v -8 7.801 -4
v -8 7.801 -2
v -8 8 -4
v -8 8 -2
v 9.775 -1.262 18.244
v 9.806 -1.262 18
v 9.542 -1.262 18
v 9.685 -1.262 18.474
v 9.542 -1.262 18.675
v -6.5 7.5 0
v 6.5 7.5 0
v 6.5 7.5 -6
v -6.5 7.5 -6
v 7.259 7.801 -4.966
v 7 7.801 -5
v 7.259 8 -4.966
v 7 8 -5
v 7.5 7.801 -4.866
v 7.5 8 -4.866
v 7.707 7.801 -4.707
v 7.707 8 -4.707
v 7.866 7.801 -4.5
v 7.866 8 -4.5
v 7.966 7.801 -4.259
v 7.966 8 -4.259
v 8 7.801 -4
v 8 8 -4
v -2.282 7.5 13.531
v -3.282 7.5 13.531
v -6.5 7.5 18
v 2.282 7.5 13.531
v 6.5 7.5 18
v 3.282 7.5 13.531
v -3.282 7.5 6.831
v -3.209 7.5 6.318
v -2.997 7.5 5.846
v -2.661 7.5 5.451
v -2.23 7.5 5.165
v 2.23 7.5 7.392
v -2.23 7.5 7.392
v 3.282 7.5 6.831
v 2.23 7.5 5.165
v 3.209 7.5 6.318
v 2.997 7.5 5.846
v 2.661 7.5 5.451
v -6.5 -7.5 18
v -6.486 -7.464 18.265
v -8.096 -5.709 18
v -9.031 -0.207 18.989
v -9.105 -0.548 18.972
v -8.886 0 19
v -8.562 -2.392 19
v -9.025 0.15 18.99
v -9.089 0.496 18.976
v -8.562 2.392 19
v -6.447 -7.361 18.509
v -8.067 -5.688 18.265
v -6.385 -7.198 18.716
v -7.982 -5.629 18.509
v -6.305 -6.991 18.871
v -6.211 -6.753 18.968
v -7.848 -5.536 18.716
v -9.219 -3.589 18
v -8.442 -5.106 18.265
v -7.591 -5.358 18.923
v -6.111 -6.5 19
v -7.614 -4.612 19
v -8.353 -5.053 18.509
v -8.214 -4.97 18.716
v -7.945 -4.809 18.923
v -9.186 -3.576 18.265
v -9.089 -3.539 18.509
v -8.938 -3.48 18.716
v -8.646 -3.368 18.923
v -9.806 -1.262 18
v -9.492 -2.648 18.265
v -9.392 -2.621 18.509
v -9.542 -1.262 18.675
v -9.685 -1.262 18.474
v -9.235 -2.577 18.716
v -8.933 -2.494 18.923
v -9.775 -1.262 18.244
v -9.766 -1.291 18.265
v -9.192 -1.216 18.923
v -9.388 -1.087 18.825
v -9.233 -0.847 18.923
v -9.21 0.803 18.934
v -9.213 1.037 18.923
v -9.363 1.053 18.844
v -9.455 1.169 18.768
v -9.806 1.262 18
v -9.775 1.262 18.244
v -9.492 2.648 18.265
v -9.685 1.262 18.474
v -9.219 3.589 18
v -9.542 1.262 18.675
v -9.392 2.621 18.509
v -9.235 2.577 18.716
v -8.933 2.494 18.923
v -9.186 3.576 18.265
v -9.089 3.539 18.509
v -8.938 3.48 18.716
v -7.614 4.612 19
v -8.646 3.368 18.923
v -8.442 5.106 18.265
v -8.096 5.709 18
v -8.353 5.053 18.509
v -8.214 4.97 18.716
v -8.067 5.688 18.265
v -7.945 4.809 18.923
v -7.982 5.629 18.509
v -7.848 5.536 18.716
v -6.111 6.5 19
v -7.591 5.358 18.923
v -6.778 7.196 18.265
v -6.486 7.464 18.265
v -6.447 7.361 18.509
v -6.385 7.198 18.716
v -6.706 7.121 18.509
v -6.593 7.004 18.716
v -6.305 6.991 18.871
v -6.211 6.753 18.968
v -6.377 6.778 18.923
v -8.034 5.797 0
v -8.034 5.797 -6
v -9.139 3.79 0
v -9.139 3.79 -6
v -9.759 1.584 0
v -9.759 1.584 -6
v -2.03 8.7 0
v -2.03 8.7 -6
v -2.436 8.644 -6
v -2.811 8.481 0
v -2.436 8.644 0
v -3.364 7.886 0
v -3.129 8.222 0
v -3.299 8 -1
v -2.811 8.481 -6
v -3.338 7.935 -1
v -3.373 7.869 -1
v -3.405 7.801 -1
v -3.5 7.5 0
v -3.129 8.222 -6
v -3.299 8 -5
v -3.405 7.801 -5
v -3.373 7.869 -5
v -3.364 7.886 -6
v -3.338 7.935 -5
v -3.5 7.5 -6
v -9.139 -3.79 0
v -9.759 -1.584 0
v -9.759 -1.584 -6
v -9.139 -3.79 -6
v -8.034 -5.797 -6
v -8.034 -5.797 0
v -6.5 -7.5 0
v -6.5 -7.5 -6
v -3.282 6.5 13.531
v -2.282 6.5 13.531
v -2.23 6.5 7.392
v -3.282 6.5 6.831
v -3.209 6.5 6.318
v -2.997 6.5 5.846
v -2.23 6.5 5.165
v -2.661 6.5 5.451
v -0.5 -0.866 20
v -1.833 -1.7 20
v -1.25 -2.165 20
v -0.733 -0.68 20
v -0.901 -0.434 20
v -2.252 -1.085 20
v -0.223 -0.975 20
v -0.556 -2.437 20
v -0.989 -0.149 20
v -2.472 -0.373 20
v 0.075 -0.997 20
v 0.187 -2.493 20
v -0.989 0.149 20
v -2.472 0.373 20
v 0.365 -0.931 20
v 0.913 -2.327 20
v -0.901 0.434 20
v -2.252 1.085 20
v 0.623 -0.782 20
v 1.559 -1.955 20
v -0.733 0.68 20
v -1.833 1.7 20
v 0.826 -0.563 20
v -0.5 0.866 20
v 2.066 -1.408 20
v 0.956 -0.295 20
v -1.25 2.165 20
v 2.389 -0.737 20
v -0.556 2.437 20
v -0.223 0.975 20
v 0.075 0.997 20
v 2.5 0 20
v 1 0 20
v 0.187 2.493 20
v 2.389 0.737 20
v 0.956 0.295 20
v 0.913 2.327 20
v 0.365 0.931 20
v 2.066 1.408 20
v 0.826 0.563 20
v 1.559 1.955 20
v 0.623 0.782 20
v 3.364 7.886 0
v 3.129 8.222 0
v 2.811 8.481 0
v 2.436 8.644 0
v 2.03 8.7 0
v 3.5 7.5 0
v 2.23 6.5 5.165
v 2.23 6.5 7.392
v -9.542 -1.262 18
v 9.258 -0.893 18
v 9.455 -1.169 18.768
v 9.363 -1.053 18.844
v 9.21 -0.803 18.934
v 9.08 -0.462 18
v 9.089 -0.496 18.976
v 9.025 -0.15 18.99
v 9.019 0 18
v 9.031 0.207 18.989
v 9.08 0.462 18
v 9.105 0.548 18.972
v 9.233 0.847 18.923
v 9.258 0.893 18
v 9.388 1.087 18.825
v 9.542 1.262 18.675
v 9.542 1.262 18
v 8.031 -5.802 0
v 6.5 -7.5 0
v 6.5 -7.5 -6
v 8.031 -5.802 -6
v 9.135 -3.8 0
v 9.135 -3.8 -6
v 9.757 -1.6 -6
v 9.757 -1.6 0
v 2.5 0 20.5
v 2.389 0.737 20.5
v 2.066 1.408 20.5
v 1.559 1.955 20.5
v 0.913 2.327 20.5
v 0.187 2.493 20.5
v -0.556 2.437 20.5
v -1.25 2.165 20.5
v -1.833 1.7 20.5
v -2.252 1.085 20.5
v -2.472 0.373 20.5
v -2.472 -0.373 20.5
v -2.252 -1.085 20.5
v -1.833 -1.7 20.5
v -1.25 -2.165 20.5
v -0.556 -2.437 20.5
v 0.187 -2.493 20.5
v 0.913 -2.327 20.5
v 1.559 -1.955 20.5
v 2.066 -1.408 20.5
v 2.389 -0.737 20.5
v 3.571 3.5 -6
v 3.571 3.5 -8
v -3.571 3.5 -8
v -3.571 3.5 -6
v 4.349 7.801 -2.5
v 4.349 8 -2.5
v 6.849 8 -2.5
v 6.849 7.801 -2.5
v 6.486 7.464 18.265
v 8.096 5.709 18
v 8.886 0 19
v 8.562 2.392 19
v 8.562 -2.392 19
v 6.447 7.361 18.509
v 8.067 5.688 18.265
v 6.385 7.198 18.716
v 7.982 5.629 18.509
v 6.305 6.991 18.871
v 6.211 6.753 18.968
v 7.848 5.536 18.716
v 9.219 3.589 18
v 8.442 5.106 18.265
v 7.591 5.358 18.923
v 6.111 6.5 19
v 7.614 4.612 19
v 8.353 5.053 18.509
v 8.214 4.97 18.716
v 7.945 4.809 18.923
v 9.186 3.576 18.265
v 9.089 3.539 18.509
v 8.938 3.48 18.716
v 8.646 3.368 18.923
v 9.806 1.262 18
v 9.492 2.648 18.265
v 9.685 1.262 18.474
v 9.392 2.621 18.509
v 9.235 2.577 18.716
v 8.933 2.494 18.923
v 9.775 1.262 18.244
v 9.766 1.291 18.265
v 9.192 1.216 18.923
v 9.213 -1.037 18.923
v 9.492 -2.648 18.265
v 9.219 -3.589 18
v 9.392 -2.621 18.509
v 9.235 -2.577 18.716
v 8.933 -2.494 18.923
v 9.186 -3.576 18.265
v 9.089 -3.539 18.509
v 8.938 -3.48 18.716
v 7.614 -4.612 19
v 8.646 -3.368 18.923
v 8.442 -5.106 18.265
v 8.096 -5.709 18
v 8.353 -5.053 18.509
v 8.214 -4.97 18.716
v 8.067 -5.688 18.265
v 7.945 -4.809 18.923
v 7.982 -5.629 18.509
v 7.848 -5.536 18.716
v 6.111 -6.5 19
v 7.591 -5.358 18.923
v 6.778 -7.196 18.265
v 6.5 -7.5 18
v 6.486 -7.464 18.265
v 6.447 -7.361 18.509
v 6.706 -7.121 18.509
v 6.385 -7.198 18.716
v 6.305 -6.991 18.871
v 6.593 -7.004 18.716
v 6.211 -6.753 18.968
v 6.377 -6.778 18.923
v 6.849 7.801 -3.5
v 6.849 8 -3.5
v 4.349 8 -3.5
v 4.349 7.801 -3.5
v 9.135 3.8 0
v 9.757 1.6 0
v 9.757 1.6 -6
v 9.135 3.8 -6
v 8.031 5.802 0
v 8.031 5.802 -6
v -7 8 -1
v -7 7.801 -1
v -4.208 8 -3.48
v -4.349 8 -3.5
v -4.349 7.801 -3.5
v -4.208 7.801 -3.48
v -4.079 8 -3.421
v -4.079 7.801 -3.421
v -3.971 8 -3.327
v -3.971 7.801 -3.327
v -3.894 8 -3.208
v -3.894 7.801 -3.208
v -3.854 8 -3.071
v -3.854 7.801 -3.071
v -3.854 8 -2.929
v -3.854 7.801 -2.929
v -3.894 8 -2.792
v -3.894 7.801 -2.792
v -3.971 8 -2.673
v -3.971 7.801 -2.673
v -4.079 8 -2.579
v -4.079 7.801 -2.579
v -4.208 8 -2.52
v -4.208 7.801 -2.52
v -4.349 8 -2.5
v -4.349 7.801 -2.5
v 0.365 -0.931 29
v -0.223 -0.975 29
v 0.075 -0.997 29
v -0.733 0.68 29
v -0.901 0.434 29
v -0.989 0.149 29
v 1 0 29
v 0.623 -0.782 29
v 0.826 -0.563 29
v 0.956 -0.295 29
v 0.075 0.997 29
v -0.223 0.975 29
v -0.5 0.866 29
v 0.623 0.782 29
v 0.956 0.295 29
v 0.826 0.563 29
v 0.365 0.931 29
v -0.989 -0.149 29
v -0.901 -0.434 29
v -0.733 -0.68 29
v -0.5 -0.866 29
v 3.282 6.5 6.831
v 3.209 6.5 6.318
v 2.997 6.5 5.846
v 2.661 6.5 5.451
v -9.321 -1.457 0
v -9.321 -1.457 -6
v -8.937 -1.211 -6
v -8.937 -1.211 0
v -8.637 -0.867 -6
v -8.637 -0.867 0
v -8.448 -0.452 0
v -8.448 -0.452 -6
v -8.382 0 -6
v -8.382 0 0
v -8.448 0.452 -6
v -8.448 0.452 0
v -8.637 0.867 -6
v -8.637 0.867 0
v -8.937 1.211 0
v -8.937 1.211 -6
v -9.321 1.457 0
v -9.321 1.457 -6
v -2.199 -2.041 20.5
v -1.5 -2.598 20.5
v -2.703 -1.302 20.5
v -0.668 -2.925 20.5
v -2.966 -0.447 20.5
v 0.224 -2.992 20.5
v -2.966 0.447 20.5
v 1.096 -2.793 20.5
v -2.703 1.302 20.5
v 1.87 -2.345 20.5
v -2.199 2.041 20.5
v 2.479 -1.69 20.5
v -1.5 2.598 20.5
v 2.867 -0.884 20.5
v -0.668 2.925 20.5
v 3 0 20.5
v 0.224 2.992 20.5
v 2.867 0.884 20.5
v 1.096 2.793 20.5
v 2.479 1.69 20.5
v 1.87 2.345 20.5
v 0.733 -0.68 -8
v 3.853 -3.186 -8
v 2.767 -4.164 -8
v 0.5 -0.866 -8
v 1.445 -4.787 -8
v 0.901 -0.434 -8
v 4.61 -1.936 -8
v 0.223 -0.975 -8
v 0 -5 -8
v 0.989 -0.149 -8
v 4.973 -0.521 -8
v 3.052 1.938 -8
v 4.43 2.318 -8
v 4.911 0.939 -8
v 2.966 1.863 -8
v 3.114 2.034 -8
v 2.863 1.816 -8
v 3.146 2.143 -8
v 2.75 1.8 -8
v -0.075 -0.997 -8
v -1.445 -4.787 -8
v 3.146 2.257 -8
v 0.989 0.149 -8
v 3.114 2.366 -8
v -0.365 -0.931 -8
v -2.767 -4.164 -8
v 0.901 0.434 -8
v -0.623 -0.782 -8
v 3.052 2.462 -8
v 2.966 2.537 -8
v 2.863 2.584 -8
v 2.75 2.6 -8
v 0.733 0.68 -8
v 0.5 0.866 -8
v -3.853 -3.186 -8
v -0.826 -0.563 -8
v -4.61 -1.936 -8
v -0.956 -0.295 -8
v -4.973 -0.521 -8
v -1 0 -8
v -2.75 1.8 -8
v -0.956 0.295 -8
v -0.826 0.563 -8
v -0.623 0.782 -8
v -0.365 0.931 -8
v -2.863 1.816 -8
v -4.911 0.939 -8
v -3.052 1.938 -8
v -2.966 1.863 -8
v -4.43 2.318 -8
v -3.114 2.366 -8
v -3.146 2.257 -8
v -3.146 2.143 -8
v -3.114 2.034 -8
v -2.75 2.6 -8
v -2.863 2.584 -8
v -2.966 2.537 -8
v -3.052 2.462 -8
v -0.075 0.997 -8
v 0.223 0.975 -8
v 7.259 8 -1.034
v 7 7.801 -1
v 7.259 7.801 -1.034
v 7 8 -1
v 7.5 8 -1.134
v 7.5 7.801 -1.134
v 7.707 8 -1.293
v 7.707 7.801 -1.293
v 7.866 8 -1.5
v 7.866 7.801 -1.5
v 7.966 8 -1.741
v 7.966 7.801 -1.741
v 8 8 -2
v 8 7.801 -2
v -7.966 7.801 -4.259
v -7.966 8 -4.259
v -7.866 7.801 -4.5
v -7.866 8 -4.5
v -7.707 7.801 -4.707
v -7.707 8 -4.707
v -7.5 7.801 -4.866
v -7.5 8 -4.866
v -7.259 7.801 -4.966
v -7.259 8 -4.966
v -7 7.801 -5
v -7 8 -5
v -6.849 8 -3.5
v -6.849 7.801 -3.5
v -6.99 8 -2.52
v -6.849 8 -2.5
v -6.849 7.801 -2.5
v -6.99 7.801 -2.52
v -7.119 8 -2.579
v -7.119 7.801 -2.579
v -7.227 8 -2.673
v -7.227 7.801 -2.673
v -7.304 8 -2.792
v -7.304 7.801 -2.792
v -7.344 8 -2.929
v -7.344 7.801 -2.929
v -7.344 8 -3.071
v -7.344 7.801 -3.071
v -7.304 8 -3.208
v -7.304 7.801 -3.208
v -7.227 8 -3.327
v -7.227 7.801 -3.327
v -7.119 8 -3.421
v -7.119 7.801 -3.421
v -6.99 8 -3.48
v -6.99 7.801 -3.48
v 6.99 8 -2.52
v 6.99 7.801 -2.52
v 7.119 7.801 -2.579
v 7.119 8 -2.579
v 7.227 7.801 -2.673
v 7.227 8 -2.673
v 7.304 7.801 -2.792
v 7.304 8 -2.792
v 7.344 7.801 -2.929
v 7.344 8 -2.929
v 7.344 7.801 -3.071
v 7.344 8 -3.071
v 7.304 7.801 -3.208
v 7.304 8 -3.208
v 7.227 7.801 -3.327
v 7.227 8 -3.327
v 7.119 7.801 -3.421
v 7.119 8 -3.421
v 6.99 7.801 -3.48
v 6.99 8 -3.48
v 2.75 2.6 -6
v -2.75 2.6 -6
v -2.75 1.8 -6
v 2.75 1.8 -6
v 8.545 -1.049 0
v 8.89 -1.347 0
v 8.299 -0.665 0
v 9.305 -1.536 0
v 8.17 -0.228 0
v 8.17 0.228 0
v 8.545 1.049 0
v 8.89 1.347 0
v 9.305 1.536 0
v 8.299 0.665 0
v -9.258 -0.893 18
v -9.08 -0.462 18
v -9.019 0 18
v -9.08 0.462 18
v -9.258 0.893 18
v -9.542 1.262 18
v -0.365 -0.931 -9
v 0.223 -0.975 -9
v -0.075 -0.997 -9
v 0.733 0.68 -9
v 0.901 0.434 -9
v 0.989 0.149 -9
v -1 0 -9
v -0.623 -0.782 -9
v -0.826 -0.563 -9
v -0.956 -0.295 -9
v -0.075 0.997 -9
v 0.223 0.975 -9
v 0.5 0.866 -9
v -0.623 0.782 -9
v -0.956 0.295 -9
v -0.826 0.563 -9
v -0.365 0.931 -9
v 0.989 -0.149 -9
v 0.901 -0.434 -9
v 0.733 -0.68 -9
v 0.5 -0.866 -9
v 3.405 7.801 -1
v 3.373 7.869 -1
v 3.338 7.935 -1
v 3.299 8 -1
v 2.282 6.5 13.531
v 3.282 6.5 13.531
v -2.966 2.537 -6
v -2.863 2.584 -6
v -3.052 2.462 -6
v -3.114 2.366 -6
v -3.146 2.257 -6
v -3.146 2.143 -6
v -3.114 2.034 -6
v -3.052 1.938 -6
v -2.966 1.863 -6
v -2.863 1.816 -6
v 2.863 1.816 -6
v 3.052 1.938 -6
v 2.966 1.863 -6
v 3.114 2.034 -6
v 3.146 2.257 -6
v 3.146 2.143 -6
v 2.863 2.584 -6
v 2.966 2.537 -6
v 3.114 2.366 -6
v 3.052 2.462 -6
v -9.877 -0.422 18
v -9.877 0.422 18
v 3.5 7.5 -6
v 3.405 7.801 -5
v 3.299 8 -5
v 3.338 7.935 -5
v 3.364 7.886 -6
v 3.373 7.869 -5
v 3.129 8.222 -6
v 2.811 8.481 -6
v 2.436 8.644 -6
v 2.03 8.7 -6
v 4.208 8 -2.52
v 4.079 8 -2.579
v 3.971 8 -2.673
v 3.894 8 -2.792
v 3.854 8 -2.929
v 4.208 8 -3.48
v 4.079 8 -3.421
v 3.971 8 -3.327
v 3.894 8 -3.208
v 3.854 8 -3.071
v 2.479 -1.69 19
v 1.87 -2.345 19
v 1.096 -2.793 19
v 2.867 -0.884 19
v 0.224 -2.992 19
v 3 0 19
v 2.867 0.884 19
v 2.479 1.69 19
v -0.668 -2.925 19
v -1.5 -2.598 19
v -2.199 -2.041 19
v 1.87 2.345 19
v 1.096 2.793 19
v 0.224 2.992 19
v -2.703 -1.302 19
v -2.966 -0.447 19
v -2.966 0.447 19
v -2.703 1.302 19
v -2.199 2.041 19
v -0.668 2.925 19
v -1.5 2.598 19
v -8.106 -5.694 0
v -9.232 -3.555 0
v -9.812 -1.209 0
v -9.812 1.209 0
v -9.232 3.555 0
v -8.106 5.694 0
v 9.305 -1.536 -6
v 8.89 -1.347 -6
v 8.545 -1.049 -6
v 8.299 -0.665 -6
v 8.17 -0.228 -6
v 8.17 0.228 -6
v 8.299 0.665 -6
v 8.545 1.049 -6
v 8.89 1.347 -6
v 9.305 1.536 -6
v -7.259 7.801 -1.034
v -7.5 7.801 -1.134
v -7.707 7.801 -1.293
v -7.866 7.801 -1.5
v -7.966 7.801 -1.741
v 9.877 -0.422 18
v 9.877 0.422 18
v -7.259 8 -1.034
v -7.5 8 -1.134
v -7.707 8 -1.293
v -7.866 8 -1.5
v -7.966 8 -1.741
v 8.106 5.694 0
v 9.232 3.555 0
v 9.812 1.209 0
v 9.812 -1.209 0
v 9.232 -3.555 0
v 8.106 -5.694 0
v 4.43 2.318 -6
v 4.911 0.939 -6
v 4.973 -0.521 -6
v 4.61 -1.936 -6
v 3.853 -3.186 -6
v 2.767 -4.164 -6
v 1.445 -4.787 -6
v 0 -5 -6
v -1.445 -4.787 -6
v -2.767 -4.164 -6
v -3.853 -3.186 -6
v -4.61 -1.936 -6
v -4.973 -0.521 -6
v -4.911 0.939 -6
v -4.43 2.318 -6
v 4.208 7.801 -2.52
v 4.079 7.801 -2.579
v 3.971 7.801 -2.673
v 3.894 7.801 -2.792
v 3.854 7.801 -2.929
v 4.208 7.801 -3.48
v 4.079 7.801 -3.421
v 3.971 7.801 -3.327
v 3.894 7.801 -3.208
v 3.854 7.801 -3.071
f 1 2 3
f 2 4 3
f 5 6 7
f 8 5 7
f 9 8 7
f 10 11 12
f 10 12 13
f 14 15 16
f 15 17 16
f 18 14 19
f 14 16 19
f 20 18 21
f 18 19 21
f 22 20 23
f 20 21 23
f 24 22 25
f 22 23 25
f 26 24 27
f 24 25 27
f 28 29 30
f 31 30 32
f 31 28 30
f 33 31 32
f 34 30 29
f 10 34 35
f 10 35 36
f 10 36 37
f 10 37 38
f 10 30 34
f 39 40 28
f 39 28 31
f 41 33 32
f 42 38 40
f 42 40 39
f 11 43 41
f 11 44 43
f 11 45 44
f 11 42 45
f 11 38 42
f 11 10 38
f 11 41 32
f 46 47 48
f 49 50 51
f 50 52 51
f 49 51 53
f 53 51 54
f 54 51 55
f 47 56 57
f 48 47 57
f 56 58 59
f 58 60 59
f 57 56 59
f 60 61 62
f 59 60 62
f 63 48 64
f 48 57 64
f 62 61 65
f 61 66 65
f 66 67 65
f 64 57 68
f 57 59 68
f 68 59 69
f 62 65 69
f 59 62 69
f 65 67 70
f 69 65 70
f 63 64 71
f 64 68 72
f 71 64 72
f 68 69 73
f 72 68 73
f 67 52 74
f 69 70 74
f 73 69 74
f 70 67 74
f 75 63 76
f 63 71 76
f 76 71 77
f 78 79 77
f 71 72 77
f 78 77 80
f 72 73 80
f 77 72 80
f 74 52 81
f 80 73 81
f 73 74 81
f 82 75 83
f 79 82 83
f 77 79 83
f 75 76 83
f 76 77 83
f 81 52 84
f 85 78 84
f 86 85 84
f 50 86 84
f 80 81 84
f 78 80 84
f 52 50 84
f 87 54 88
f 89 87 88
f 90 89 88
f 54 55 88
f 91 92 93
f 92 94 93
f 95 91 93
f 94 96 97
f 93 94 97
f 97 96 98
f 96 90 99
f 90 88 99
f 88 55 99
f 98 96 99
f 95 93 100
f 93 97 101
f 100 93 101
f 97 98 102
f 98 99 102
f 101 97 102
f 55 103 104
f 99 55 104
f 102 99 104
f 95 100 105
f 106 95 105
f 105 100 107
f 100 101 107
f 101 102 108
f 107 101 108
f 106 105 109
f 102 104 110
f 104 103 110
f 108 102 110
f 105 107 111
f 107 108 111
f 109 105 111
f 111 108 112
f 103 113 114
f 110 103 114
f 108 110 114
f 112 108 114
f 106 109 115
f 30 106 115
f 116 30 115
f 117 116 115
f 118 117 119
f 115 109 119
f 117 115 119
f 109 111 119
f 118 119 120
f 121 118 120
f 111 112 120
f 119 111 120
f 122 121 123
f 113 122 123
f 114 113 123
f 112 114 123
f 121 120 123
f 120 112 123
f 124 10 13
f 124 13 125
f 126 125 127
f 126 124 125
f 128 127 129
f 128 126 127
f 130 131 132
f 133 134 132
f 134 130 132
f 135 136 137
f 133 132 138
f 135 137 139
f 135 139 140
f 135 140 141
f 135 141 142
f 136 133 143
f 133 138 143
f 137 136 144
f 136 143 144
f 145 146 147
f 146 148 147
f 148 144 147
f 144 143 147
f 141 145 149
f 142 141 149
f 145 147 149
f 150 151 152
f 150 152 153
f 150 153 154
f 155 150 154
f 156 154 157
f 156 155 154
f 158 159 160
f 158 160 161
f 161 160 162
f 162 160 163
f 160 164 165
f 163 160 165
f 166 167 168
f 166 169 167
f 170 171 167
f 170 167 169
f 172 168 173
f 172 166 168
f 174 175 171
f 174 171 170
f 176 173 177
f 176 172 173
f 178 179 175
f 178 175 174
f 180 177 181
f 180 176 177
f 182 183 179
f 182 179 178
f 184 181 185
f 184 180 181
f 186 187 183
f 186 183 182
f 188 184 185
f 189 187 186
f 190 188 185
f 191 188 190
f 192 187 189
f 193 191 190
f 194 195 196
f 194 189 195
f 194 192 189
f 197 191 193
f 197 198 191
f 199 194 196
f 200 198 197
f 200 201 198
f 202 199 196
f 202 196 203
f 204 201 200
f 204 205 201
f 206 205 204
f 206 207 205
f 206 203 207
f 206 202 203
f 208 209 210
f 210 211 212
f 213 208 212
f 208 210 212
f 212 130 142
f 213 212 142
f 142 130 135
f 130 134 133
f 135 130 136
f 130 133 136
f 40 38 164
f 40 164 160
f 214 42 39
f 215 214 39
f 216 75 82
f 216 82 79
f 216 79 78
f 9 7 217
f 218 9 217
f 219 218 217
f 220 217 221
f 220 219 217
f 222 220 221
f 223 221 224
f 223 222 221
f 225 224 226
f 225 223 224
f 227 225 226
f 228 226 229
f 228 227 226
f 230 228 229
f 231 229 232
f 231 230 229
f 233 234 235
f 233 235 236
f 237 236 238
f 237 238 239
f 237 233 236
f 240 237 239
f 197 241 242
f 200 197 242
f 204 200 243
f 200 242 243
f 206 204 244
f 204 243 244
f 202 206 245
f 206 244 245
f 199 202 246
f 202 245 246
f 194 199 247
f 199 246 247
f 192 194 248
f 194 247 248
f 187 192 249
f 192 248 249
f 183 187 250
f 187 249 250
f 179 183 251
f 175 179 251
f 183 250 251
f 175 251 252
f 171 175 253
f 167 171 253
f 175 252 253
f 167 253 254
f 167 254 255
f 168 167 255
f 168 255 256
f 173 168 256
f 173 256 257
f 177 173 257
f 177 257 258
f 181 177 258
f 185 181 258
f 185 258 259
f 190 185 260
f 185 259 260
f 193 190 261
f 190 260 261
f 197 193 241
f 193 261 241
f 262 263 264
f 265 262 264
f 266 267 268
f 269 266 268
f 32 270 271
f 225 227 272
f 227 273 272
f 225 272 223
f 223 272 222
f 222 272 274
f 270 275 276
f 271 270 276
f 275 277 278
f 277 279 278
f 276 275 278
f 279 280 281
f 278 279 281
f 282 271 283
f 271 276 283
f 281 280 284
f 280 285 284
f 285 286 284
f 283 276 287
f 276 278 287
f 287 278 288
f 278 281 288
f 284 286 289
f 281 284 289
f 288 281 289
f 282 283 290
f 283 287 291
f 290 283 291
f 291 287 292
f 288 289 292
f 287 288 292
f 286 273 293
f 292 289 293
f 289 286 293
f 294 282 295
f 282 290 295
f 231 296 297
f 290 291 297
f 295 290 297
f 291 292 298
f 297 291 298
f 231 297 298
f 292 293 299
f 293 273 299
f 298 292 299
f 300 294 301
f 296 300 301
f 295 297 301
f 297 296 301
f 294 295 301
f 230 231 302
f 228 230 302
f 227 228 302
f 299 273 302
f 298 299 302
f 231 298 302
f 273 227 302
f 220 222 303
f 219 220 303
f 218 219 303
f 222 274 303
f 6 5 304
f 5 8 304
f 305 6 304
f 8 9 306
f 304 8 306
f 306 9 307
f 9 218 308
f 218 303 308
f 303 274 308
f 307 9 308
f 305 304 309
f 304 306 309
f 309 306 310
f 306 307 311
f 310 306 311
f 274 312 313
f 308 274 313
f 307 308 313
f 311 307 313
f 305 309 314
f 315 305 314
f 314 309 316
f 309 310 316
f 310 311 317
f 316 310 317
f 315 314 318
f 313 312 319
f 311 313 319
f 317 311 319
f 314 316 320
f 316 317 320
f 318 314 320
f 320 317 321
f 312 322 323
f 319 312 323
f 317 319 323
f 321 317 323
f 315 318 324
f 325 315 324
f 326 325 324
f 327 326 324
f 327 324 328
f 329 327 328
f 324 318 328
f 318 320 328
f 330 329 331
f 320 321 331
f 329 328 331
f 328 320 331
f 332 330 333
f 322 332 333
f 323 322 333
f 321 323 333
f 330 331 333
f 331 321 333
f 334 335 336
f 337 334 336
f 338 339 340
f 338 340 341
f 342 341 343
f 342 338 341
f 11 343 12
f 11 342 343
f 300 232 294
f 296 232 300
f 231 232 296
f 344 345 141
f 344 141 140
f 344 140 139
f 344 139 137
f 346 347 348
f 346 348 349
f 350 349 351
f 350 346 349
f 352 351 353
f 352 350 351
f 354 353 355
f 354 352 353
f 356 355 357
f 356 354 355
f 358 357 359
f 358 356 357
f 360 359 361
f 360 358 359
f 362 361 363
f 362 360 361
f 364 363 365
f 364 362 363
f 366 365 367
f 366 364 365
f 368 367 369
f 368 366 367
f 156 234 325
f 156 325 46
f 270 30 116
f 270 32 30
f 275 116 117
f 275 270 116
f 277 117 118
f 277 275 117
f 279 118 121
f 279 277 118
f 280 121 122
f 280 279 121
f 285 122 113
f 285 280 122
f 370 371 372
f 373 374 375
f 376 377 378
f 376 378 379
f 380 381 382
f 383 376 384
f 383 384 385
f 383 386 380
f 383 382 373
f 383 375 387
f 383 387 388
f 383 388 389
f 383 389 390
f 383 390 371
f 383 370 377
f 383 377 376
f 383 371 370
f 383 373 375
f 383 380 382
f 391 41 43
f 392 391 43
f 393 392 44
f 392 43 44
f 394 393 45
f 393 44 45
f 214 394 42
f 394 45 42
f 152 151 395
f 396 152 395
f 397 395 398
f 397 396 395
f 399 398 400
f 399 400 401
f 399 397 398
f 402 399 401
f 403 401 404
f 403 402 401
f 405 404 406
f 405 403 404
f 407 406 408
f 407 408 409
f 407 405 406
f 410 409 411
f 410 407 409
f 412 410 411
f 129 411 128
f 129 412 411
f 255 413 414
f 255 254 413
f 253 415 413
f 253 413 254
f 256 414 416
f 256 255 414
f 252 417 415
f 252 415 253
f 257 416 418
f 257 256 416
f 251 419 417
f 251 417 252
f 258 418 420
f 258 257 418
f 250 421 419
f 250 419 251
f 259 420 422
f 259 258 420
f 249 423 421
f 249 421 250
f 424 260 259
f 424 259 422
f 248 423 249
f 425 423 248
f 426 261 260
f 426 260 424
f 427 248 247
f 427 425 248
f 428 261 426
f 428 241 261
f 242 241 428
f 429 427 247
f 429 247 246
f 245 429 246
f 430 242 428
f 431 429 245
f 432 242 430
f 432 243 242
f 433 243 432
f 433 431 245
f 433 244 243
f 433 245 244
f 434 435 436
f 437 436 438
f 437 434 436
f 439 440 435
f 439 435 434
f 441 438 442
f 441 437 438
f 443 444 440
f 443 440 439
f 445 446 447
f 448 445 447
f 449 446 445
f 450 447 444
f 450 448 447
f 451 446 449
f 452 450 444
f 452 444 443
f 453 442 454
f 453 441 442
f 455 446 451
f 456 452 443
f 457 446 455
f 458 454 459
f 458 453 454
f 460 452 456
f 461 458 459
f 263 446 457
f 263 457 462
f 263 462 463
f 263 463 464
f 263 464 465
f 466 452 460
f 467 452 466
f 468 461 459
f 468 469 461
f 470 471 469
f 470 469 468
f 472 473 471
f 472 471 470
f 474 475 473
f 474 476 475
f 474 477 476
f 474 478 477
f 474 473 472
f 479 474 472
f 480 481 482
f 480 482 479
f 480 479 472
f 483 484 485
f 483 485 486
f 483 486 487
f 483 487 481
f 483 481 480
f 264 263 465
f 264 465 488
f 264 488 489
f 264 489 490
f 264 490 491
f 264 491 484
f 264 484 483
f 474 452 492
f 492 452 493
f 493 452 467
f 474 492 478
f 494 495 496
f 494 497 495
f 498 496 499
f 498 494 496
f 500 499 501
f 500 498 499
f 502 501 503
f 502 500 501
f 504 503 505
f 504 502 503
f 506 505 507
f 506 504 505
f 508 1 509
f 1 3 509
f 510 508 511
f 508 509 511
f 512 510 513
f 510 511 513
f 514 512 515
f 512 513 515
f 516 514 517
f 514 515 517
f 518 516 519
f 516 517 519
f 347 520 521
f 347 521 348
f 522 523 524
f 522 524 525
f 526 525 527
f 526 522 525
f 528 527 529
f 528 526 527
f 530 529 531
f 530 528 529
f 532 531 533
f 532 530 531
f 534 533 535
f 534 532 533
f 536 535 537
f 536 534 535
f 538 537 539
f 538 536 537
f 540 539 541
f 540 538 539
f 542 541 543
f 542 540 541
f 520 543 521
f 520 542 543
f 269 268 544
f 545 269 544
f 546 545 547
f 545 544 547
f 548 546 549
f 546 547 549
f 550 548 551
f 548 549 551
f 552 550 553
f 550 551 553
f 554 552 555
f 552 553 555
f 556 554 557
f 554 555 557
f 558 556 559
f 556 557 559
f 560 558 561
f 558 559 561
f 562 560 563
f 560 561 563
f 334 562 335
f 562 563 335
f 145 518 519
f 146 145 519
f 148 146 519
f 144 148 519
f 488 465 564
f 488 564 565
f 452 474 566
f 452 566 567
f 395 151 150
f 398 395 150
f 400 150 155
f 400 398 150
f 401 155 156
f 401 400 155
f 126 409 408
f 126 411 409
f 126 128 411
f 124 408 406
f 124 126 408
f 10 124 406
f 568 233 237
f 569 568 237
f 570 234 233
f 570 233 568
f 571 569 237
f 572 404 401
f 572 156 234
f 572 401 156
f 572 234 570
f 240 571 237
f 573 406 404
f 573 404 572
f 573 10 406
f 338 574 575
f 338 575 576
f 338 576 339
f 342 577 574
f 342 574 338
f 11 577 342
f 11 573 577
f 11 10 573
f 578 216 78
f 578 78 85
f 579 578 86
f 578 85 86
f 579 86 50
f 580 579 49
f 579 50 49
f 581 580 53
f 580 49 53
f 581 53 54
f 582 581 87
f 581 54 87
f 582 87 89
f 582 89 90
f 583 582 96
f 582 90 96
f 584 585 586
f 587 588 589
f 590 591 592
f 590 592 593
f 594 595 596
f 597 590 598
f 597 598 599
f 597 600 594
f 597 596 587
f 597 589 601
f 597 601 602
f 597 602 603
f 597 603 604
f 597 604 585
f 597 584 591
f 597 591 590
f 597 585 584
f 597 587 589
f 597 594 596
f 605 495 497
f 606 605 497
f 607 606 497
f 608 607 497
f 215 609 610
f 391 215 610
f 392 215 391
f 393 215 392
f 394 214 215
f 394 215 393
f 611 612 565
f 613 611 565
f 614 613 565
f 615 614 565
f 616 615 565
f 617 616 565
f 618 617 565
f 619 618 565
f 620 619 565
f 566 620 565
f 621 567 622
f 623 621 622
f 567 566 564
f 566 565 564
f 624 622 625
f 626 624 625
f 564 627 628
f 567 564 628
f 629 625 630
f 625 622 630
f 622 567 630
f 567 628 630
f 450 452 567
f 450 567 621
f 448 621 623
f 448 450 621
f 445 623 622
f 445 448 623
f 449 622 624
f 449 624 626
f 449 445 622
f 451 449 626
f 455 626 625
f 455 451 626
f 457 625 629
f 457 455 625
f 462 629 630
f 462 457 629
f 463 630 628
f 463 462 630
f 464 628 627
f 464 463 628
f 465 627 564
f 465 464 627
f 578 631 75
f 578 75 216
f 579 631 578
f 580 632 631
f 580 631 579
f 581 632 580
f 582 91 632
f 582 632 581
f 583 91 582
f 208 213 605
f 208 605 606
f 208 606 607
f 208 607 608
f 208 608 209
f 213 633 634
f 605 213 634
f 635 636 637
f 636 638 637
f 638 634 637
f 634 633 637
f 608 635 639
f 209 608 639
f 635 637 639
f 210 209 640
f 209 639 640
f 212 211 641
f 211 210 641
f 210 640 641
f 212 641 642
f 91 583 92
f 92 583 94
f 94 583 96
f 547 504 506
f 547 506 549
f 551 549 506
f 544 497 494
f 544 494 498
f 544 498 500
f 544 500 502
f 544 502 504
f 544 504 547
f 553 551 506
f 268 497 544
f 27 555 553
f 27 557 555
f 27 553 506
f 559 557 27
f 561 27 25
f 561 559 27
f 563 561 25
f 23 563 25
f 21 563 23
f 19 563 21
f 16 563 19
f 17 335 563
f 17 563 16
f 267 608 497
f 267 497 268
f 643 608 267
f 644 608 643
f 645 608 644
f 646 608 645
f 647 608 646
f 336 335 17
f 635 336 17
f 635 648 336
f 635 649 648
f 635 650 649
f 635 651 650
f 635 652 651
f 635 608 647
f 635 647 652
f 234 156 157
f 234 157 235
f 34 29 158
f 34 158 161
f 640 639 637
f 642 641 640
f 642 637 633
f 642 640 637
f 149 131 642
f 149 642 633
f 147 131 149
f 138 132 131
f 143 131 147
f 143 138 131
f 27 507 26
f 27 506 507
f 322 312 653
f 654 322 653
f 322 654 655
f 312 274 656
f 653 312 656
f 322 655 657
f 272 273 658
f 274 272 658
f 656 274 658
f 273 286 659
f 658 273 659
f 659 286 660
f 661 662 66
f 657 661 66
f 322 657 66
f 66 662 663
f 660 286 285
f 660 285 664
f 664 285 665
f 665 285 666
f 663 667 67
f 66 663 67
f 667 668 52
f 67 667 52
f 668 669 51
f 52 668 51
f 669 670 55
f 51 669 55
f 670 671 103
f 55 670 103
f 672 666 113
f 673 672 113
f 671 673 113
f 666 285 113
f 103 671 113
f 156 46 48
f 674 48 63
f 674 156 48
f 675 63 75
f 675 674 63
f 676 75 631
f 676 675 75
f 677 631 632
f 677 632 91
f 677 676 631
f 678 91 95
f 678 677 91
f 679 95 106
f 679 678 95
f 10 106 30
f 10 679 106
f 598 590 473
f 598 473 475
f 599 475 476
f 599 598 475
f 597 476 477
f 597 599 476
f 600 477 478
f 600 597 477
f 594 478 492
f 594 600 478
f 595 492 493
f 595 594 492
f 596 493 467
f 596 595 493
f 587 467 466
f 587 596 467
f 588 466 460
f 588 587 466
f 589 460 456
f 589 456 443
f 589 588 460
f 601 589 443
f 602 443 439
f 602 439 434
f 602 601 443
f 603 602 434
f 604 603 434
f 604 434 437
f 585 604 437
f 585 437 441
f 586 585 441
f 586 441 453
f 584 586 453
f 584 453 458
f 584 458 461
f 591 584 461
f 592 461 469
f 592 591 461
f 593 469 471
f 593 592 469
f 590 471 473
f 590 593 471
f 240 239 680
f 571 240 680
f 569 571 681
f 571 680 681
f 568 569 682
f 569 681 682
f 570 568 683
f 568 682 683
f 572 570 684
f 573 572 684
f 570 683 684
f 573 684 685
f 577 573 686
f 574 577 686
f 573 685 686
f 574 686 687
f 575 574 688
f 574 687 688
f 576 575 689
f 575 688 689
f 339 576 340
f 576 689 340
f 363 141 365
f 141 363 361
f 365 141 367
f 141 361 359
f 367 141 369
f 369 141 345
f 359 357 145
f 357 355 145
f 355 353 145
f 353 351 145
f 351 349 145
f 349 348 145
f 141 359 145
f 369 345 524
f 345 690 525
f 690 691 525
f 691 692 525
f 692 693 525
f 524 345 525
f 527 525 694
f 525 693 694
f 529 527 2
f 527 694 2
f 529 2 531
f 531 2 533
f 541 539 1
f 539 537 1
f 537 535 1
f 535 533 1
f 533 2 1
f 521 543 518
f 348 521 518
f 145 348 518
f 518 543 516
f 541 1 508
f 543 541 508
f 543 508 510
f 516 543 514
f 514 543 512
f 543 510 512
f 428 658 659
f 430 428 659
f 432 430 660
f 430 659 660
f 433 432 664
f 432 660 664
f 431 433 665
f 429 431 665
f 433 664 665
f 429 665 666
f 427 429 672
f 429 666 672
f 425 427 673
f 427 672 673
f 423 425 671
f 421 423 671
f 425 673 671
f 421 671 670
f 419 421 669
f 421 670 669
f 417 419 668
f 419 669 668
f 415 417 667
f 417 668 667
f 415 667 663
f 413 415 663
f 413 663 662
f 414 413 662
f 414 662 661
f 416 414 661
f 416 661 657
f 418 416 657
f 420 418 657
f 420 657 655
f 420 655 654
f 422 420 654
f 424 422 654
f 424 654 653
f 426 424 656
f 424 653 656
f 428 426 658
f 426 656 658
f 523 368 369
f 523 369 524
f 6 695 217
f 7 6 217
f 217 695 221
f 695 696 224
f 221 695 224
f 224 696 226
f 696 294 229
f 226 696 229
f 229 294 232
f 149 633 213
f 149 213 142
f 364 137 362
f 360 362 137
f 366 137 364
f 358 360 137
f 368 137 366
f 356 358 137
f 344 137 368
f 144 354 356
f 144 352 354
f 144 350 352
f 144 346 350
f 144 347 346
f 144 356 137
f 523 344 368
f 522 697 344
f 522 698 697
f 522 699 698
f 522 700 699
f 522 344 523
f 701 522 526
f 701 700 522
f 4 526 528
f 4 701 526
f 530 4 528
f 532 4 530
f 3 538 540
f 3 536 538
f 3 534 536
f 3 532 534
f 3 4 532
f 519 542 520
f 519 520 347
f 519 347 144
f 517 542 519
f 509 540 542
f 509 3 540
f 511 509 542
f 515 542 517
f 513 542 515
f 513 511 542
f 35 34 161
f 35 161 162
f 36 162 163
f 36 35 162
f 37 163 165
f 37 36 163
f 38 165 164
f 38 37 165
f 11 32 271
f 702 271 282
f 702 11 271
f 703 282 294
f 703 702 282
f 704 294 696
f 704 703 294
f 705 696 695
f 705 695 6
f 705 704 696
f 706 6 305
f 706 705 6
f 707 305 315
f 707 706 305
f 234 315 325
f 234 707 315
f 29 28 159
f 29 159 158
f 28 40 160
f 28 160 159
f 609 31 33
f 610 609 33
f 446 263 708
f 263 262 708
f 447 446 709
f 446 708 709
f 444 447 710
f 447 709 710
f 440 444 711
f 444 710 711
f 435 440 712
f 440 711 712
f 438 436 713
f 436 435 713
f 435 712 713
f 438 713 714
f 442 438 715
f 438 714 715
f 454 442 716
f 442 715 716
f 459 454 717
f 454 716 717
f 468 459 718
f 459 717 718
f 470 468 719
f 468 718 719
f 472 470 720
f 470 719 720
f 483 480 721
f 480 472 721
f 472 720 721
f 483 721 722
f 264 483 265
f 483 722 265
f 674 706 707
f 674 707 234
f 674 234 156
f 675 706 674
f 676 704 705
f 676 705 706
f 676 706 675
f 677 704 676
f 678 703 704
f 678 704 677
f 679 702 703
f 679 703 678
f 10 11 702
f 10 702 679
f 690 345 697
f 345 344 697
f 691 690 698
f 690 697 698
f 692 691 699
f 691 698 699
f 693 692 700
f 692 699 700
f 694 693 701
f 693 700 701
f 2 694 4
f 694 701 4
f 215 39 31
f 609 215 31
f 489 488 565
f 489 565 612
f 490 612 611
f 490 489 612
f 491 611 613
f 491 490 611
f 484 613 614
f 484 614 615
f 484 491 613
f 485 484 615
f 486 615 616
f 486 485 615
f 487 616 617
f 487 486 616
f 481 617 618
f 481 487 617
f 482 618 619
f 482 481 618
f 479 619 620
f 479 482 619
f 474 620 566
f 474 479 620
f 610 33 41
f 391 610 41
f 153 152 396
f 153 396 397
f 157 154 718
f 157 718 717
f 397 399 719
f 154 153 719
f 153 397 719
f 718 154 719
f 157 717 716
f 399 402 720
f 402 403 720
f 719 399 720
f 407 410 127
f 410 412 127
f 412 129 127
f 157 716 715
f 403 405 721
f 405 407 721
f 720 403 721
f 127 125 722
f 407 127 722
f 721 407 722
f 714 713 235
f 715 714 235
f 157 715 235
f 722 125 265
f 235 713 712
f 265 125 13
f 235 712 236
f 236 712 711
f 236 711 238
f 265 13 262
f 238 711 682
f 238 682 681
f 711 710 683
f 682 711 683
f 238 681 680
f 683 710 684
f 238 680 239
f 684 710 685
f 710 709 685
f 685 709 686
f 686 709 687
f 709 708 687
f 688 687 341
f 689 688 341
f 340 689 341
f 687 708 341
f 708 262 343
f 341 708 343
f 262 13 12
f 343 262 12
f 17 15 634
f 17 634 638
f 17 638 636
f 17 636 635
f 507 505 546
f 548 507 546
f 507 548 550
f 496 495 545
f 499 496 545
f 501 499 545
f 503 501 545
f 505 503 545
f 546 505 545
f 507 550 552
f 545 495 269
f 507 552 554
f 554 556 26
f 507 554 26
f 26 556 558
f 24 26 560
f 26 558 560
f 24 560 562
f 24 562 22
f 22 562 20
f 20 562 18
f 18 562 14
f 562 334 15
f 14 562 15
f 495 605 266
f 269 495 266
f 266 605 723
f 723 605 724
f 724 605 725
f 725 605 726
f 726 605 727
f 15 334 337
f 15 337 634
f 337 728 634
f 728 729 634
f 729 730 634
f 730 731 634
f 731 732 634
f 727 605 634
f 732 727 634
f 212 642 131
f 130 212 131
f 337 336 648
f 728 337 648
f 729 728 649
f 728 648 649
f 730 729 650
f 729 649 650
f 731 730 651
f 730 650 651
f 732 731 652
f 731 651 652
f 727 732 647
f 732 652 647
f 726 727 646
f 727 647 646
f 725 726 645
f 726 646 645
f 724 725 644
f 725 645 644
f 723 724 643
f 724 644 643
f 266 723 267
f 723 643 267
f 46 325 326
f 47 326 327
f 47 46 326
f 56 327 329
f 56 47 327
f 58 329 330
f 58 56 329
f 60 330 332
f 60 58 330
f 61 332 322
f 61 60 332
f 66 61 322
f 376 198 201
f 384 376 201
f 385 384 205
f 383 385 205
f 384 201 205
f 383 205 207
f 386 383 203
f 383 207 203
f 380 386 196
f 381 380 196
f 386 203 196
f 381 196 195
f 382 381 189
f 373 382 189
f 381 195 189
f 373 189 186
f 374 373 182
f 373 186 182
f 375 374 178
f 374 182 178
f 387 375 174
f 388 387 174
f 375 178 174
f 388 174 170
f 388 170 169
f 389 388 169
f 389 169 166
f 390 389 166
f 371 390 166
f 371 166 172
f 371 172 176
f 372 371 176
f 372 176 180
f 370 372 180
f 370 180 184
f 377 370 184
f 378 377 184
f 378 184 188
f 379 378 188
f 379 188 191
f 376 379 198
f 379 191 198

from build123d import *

# Parameters (mm, degrees)
Y_KSEKLIK_EKSTR_ZYON1_DEPTH      = 19
RADYUS1_R                        = 1
IZIM2_R                          = 3
Y_KSEKLIK_EKSTR_ZYON2_DEPTH      = 1.5
IZIM3_R                          = 2.5
KES_EKSTR_ZYON1_DEPTH            = 0.5
IZIM4_R                          = 1
Y_KSEKLIK_EKSTR_ZYON3_DEPTH      = 9
Y_KSEKLIK_EKSTR_ZYON4_DEPTH      = 6
KES_EKSTR_ZYON2_DEPTH            = 6
Y_KSEKLIK_EKSTR_ZYON5_DEPTH      = 2
Y_KSEKLIK_EKSTR_ZYON5_DEPTH_BACK = 2
IZIM7_R                          = 5
Y_KSEKLIK_EKSTR_ZYON6_START      = 1
IZIM8_R                          = 1
Y_KSEKLIK_EKSTR_ZYON6_DEPTH      = 1
KES_EKSTR_ZYON4_DEPTH            = 2
KES_EKSTR_ZYON5_DEPTH            = 2
IZIM11_W                         = 7
IZIM11_H                         = 1.2
Y_KSEKLIK_EKSTR_ZYON7_DEPTH      = 6
RADYUS6_R                        = 1.5
Y_KSEKLIK_EKSTR_ZYON9_DEPTH      = 8
Y_KSEKLIK_EKSTR_ZYON9_DEPTH_BACK = 8
IZIM14_W                         = 4
IZIM14_H                         = 0.199221602
KES_EKSTR_ZYON8_DEPTH            = 1
RADYUS8_R                        = 1
KES_EKSTR_ZYON9_DEPTH            = 1
KES_EKSTR_ZYON10_DEPTH           = 1


with BuildPart() as part:
    # Çizim1 → Yükseklik-Ekstrüzyon1 (new body)
    with BuildSketch(Plane.XY):
        with BuildLine():
            Line((-6.5, 7.5), (6.5, 7.5))
            ThreePointArc((6.5, 7.5), (9.885621722, 0), (6.5, -7.5))
            Line((6.5, -7.5), (-6.5, -7.5))
            ThreePointArc((-6.5, -7.5), (-9.885621722, 0), (-6.5, 7.5))
        make_face()
    extrude(amount=Y_KSEKLIK_EKSTR_ZYON1_DEPTH)

    # Radyus1
    radyus1_edges = [part.edges().sort_by_distance(p)[0] for p in [
        (9.885621722, 0, 19),
        (0, 7.5, 19),
        (-9.885621722, 0, 19),
        (0, -7.5, 19),
    ]]
    fillet(radyus1_edges, radius=RADYUS1_R)

    # Çizim2 → Yükseklik-Ekstrüzyon2 (add)
    with BuildSketch(Plane.XY.offset(19)):
        Circle(IZIM2_R)
    extrude(amount=Y_KSEKLIK_EKSTR_ZYON2_DEPTH)

    # Çizim3 → Kes-Ekstrüzyon1 (cut)
    with BuildSketch(Plane.XY.offset(20.5)):
        Circle(IZIM3_R)
    extrude(amount=-KES_EKSTR_ZYON1_DEPTH, mode=Mode.SUBTRACT)

    # Çizim4 → Yükseklik-Ekstrüzyon3 (add)
    with BuildSketch(Plane.XY.offset(20)):
        Circle(IZIM4_R)
    extrude(amount=Y_KSEKLIK_EKSTR_ZYON3_DEPTH)

    # Çizim16 → Kes-Ekstrüzyon9 (cut)
    with BuildSketch(Plane(origin=(0, 7.5, 0), x_dir=(1, 0, 0), z_dir=(0, 1, 0))):
        with BuildLine():
            Line((-3.281639929, -13.531109413), (-3.281639929, -6.83072225))
            ThreePointArc((-3.281639929, -6.83072225), (-2.996642201, -5.845727443), (-2.229713406, -5.165096342))
            Line((-2.229713406, -5.165096342), (-2.229713406, -7.39241151))
            Line((-2.229713406, -7.39241151), (-2.281639929, -13.531109413))
            Line((-2.281639929, -13.531109413), (-3.281639929, -13.531109413))
        make_face()
        with BuildLine():
            Line((2.281639929, -13.531109413), (3.281639929, -13.531109413))
            Line((3.281639929, -13.531109413), (3.281639929, -6.83072225))
            ThreePointArc((3.281639929, -6.83072225), (2.996642201, -5.845727443), (2.229713406, -5.165096342))
            Line((2.229713406, -5.165096342), (2.229713406, -7.39241151))
            Line((2.229713406, -7.39241151), (2.281639929, -13.531109413))
        make_face()
    extrude(amount=-KES_EKSTR_ZYON9_DEPTH, mode=Mode.SUBTRACT)

    # Çizim17 → Kes-Ekstrüzyon10 (cut)
    with BuildSketch(Plane.XY.offset(19)):
        with BuildLine():
            Line((-9.541715251, 1.262192915), (-10.236500342, 1.262192915))
            Line((-10.236500342, 1.262192915), (-10.236500342, -1.262192915))
            Line((-10.236500342, -1.262192915), (-9.541715251, -1.262192915))
            ThreePointArc((-9.541715251, -1.262192915), (-9.018897827, 0), (-9.541715251, 1.262192915))
        make_face()
        with BuildLine():
            Line((10.236500342, -1.262192915), (9.541715251, -1.262192915))
            ThreePointArc((9.541715251, -1.262192915), (9.018897827, 0), (9.541715251, 1.262192915))
            Line((9.541715251, 1.262192915), (10.236500342, 1.262192915))
            Line((10.236500342, 1.262192915), (10.236500342, -1.262192915))
        make_face()
    extrude(amount=-KES_EKSTR_ZYON10_DEPTH, mode=Mode.SUBTRACT)


with BuildPart() as body_2:
    # Çizim5 → Yükseklik-Ekstrüzyon4 (new body)
    with BuildSketch(Plane(origin=(0, 0, 0), x_dir=(-1, 0, 0), z_dir=(0, 0, -1))):
        with BuildLine():
            Line((-6.5, 7.5), (6.5, 7.5))
            ThreePointArc((6.5, 7.5), (9.885621722, 0), (6.5, -7.5))
            Line((6.5, -7.5), (-6.5, -7.5))
            ThreePointArc((-6.5, -7.5), (-9.885621722, 0), (-6.5, 7.5))
        make_face()
    extrude(amount=Y_KSEKLIK_EKSTR_ZYON4_DEPTH)

    # Çizim6 → Kes-Ekstrüzyon2 (cut)
    with BuildSketch(Plane(origin=(0, 0, -6), x_dir=(-1, 0, 0), z_dir=(0, 0, -1))):
        with BuildLine():
            ThreePointArc((-9.756792343, -1.599997058), (-8.153724068, 0), (-9.756792343, 1.599997058))
            ThreePointArc((-9.756792343, 1.599997058), (-9.885621722, 0), (-9.756792343, -1.599997058))
        make_face()
        with BuildLine():
            ThreePointArc((9.985548898, 1.599997058), (10.114378278, 0), (9.985548898, -1.599997058))
            ThreePointArc((9.985548898, -1.599997058), (8.382480624, 0), (9.985548898, 1.599997058))
        make_face()
    extrude(amount=-KES_EKSTR_ZYON2_DEPTH, mode=Mode.SUBTRACT)

    # Çizim7 → Yükseklik-Ekstrüzyon5 (add, two sides: drawn at the far end of the back side and taken through both)
    with BuildSketch(Plane(origin=(0, 0, -6), x_dir=(-1, 0, 0), z_dir=(0, 0, -1)).offset(-Y_KSEKLIK_EKSTR_ZYON5_DEPTH_BACK)):
        Circle(IZIM7_R)
    extrude(amount=Y_KSEKLIK_EKSTR_ZYON5_DEPTH + Y_KSEKLIK_EKSTR_ZYON5_DEPTH_BACK)

    # Çizim8 → Yükseklik-Ekstrüzyon6 (add)
    with BuildSketch(Plane(origin=(0, 0, -8), x_dir=(-1, 0, 0), z_dir=(0, 0, -1)).offset(Y_KSEKLIK_EKSTR_ZYON6_START)):
        Circle(IZIM8_R)
    extrude(amount=-Y_KSEKLIK_EKSTR_ZYON6_DEPTH)

    # Çizim10 → Kes-Ekstrüzyon4 (cut)
    with BuildSketch(Plane(origin=(0, 0, -8), x_dir=(-1, 0, 0), z_dir=(0, 0, -1))):
        with BuildLine():
            Line((-2.75, 2.6), (2.75, 2.6))
            ThreePointArc((2.75, 2.6), (3.15, 2.2), (2.75, 1.8))
            Line((2.75, 1.8), (-2.75, 1.8))
            ThreePointArc((-2.75, 1.8), (-3.15, 2.2), (-2.75, 2.6))
        make_face()
    extrude(amount=-KES_EKSTR_ZYON4_DEPTH, mode=Mode.SUBTRACT)

    # Çizim9 → Kes-Ekstrüzyon5 (cut)
    with BuildSketch(Plane(origin=(0, 0, -8), x_dir=(-1, 0, 0), z_dir=(0, 0, -1))):
        with BuildLine():
            Line((-3.570714214, 3.5), (3.570714214, 3.5))
            ThreePointArc((3.570714214, 3.5), (0, 5), (-3.570714214, 3.5))
        make_face()
    extrude(amount=-KES_EKSTR_ZYON5_DEPTH, mode=Mode.SUBTRACT)


with BuildPart() as body_3:
    # Çizim11 → Yükseklik-Ekstrüzyon7 (new body)
    with BuildSketch(Plane(origin=(0, 0, -6), x_dir=(-1, 0, 0), z_dir=(0, 0, -1))):
        with Locations((0, 8.1)):
            Rectangle(IZIM11_W, IZIM11_H)
    extrude(amount=-Y_KSEKLIK_EKSTR_ZYON7_DEPTH)

    # Radyus6
    # the kernel refuses this fillet: 1.5 mm, written as the material it takes off along each edge
    with BuildSketch(Plane(origin=(-3.5, 8.7, -9.674234614), x_dir=(1.5657845390625173e-12, -1.0, 0), z_dir=(0, 0, 1))) as radyus6_piece_1:
        with BuildLine():
            CenterArc((1.5, 1.469693846), RADYUS6_R, 180, 78.463040967)
            Line((0, 1.469693846), (-0.03, 1.469693846))
            Line((-0.03, 1.469693846), (-0.03, 0))
            Line((-0.03, 0), (0, -0.03))
            ThreePointArc((0, -0.03), (0.6, -0.03), (1.194, -0.029393877))
            Line((1.194, -0.029393877), (1.2, 0))
        make_face()
    extrude(amount=13.348469228, mode=Mode.SUBTRACT)
    with BuildSketch(Plane(origin=(3.5, 8.7, -9.674234614), x_dir=(-1, 0, 0), z_dir=(0, 0, 1))) as radyus6_piece_2:
        with BuildLine():
            CenterArc((1.469693846, 1.5), RADYUS6_R, 191.536959033, 78.463040967)
            Line((0, 1.2), (-0.029393877, 1.194))
            ThreePointArc((-0.029393877, 1.194), (-0.03, 0.6), (-0.03, 0))
            Line((-0.03, 0), (0, -0.03))
            Line((0, -0.03), (1.469693846, -0.03))
            Line((1.469693846, -0.03), (1.469693846, 0))
        make_face()
    extrude(amount=13.348469228, mode=Mode.SUBTRACT)

    # Çizim14 → Yükseklik-Ekstrüzyon9 (add, two sides: drawn at the far end of the back side and taken through both)
    with BuildSketch(Plane(origin=(0, 0, 0), x_dir=(0, 0, -1), z_dir=(1, 0, 0)).offset(-Y_KSEKLIK_EKSTR_ZYON9_DEPTH_BACK)):
        with Locations((3, 7.900389199)):
            Rectangle(IZIM14_W, IZIM14_H)
    extrude(amount=Y_KSEKLIK_EKSTR_ZYON9_DEPTH + Y_KSEKLIK_EKSTR_ZYON9_DEPTH_BACK)

    # Çizim15 → Kes-Ekstrüzyon8 (cut)
    with BuildSketch(Plane(origin=(0, 8.7, 0), x_dir=(1, 0, 0), z_dir=(0, 1, 0))):
        with BuildLine():
            Line((-6.849163908, 3.5), (-4.349163908, 3.5))
            ThreePointArc((-4.349163908, 3.5), (-3.849163908, 3), (-4.349163908, 2.5))
            Line((-4.349163908, 2.5), (-6.849163908, 2.5))
            ThreePointArc((-6.849163908, 2.5), (-7.349163908, 3), (-6.849163908, 3.5))
        make_face()
        with BuildLine():
            Line((6.849163908, 3.5), (4.349163908, 3.5))
            ThreePointArc((4.349163908, 3.5), (3.849163908, 3), (4.349163908, 2.5))
            Line((4.349163908, 2.5), (6.849163908, 2.5))
            ThreePointArc((6.849163908, 2.5), (7.349163908, 3), (6.849163908, 3.5))
        make_face()
    extrude(amount=-KES_EKSTR_ZYON8_DEPTH, mode=Mode.SUBTRACT)

    # Radyus8
    radyus8_edges = [body_3.edges().sort_by_distance(p)[0] for p in [
        (-8, 7.900389199, -1),
        (-8, 7.900389199, -5),
        (8, 7.900389199, -1),
        (8, 7.900389199, -5),
    ]]
    fillet(radyus8_edges, radius=RADYUS8_R)


solid = Compound([part.part, body_2.part, body_3.part])
